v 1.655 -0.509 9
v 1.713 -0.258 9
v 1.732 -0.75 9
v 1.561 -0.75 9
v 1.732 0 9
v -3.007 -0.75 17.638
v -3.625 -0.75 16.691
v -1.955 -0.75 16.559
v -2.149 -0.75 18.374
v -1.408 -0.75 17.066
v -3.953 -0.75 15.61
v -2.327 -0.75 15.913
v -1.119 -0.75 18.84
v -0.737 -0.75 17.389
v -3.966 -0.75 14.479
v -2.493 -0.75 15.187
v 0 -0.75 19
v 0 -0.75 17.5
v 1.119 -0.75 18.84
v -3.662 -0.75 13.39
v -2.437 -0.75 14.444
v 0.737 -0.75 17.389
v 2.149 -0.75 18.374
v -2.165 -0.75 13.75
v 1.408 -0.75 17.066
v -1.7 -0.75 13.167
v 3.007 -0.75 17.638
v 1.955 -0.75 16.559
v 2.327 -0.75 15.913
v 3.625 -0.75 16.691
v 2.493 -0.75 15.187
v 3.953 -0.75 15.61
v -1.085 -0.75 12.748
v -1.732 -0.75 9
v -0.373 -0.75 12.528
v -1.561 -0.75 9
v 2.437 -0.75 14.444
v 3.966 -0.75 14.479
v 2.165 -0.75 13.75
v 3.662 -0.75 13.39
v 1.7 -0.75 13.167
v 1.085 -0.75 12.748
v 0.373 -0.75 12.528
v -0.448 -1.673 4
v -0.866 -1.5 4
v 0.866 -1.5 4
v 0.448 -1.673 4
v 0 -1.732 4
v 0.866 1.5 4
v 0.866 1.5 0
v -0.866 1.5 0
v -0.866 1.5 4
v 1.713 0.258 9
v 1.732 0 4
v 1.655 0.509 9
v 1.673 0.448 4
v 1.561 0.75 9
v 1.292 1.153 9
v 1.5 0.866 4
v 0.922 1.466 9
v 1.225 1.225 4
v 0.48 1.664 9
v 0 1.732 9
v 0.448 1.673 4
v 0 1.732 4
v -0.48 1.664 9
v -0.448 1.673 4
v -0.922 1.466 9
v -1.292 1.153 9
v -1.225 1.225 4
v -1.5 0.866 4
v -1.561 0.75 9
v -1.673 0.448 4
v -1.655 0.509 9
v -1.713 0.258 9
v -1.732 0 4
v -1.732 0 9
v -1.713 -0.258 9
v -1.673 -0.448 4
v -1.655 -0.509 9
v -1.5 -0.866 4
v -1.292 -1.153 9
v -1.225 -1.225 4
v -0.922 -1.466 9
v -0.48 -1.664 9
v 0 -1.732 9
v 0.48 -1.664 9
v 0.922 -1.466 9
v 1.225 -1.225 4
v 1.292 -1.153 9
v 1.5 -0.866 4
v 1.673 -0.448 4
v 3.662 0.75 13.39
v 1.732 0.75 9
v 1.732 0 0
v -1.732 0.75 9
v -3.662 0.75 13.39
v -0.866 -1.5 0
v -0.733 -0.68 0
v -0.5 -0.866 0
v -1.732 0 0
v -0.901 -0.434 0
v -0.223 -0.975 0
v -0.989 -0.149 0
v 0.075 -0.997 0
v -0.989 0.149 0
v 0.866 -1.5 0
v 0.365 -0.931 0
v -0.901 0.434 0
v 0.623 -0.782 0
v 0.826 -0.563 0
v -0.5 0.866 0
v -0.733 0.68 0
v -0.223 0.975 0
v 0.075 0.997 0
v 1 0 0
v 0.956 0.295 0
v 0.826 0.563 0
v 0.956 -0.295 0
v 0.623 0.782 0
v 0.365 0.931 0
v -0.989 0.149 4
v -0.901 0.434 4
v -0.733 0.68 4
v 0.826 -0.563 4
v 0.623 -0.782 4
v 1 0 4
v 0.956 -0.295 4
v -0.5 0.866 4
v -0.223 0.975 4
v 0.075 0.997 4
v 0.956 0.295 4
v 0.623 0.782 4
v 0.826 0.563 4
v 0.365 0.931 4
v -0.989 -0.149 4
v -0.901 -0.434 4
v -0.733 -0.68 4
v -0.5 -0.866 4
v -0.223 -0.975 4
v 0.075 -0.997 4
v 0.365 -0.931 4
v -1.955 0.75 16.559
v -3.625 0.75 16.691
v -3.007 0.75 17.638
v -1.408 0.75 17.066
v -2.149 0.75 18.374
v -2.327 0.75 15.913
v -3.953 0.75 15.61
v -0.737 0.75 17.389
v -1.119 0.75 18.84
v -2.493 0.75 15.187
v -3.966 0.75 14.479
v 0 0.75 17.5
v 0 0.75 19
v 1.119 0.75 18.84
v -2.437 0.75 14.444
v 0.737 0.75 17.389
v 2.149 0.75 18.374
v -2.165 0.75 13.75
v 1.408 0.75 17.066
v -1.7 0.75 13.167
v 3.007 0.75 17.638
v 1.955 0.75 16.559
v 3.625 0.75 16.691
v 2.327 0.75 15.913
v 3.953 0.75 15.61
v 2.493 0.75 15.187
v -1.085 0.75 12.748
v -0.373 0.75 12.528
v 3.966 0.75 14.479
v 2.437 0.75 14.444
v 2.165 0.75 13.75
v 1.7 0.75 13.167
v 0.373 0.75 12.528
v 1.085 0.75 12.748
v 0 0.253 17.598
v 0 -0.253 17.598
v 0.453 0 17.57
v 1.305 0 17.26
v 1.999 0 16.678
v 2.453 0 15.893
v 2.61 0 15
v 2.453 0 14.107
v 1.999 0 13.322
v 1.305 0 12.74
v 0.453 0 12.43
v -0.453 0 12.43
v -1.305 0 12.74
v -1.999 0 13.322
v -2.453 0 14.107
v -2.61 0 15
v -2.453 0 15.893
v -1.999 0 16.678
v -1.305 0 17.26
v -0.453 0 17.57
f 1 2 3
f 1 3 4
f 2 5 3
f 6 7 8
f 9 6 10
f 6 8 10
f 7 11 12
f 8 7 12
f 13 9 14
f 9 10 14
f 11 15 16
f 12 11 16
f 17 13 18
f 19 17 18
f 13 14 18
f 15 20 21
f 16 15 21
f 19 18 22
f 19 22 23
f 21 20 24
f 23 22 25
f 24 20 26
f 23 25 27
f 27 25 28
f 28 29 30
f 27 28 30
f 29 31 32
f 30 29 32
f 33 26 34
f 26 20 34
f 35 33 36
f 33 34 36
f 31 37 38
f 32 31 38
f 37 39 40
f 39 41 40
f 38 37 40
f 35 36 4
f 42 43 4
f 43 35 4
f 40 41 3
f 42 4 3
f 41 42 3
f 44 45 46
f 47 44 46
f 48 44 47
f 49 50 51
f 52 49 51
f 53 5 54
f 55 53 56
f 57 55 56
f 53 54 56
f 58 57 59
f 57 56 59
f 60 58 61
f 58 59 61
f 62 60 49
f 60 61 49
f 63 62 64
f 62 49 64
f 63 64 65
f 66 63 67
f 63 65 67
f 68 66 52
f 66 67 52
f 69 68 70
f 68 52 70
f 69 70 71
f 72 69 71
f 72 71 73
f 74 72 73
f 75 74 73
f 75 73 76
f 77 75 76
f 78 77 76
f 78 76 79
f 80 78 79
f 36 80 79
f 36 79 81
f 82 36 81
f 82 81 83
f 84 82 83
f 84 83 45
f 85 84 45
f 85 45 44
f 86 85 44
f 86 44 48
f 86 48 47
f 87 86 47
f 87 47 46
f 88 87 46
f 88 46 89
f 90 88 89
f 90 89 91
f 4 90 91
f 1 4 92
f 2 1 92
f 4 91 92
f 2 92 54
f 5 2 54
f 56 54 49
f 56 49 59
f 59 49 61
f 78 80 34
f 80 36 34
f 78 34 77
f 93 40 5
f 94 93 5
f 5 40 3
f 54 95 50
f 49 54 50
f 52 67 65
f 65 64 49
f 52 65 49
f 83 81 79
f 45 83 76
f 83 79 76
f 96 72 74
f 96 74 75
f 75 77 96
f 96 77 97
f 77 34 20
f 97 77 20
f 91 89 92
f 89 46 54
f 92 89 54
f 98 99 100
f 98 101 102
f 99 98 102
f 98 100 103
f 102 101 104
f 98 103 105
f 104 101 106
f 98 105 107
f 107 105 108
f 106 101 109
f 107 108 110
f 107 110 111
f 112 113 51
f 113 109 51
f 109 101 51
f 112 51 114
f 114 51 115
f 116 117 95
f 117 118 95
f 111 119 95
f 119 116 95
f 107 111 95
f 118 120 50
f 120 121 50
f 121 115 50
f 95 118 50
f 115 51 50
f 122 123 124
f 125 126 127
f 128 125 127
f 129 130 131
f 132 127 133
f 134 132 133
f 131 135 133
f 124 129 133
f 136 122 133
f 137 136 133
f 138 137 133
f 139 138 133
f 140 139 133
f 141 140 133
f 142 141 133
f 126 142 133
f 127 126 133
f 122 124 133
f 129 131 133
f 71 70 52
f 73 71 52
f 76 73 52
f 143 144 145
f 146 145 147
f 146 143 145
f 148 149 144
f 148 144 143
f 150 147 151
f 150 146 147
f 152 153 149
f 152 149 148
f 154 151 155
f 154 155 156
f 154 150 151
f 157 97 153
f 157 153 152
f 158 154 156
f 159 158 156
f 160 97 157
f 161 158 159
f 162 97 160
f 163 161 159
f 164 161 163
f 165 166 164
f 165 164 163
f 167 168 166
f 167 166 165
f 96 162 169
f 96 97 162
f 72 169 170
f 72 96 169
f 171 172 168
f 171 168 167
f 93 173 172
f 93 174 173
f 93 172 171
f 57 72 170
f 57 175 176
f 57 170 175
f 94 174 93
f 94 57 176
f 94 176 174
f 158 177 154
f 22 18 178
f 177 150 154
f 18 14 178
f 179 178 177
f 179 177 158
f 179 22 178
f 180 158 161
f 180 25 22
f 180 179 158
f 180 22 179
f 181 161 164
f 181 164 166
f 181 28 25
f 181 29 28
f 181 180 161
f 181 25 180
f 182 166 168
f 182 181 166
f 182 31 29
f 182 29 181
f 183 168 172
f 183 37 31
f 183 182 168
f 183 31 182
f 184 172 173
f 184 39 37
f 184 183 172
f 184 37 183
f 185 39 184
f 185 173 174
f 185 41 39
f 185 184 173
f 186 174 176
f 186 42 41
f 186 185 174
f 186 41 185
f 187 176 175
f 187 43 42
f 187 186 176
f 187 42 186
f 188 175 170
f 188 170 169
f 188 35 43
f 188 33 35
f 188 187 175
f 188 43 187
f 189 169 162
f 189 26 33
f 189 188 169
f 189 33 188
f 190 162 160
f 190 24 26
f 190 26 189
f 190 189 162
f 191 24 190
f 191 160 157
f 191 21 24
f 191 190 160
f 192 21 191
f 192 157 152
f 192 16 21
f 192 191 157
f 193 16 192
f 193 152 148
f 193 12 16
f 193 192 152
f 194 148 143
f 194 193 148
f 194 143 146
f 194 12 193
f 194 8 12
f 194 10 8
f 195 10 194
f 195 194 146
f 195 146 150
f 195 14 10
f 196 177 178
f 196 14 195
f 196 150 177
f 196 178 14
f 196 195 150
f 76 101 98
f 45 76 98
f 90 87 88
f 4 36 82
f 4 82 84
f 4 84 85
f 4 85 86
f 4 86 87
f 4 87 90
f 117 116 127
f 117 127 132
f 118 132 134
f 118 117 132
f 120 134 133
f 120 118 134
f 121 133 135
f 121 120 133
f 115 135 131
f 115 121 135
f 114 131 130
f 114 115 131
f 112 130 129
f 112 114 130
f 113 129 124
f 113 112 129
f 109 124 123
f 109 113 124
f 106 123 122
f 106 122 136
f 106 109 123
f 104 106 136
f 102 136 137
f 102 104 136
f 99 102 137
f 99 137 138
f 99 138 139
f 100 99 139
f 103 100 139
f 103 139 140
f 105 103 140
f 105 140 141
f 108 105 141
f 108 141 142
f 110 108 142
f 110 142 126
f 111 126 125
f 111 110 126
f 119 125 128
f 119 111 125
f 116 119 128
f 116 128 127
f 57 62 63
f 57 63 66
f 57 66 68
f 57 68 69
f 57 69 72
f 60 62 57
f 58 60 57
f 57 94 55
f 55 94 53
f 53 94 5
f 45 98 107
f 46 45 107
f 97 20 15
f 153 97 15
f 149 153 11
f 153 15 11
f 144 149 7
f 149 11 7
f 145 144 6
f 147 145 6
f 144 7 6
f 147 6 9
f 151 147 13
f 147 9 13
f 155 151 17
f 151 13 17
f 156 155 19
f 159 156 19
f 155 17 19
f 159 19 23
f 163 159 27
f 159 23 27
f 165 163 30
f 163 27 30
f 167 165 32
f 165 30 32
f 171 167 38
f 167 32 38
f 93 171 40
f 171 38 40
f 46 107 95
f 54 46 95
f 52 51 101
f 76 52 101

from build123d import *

# Parameters (mm, degrees)
SKETCH_1_R           = 1
EXTRUDE_1_DEPTH      = 4
EXTRUDE_START        = 4
SKETCH_2_R           = 1.732050808
EXTRUDE_2_DEPTH      = 5
EXTRUDE_3_DEPTH      = 0.75
EXTRUDE_3_DEPTH_BACK = 0.75
SKETCH_3_R           = 2.5


with BuildPart() as part:
    # 草图1 → 凸台-拉伸1 (new body)
    with BuildSketch(Plane.XY):
        Polygon((0.866025404, 1.5), (-0.866025404, 1.5), (-1.732050808, 0), (-0.866025404, -1.5), (0.866025404, -1.5), (1.732050808, 0), align=None)
        Circle(SKETCH_1_R, mode=Mode.SUBTRACT)
    extrude(amount=EXTRUDE_1_DEPTH)

    # 草图2 → 凸台-拉伸2 (add)
    with BuildSketch(Plane.XY.offset(EXTRUDE_START)):
        Circle(SKETCH_2_R)
    extrude(amount=EXTRUDE_2_DEPTH)

    # 草图3 → 凸台-拉伸3 (add, two sides: drawn at the far end of the back side and taken through both)
    with BuildSketch(Plane(origin=(0, 0, 0), x_dir=(1, 0, 0), z_dir=(0, 1, 0)).offset(-EXTRUDE_3_DEPTH_BACK)):
        with BuildLine():
            Line((-1.732050808, -9), (-3.661865884, -13.39042296))
            ThreePointArc((-3.661865884, -13.39042296), (0, -19), (3.661865884, -13.39042296))
            Line((3.661865884, -13.39042296), (1.732050808, -9))
            Line((1.732050808, -9), (-1.732050808, -9))
        make_face()
        with Locations(Location((0, -15, 0), (0, 0, 270))):
            Circle(SKETCH_3_R, mode=Mode.SUBTRACT)
    extrude(amount=EXTRUDE_3_DEPTH + EXTRUDE_3_DEPTH_BACK)

    # 草图4 → 切除-旋转2 (revolve, cut)
    with BuildSketch(Plane(origin=(0, 0, 0), x_dir=(0, 0, -1), z_dir=(1, 0, 0))):
        with BuildLine():
            Line((-15, -2.610076627), (-15, 2.610076627))
            ThreePointArc((-15, 2.610076627), (-17.610076627, 0), (-15, -2.610076627))
        make_face()
    revolve(axis=Axis((0, -2.610076627, 15), (0, 1, 0)), mode=Mode.SUBTRACT)


solid = part.part
